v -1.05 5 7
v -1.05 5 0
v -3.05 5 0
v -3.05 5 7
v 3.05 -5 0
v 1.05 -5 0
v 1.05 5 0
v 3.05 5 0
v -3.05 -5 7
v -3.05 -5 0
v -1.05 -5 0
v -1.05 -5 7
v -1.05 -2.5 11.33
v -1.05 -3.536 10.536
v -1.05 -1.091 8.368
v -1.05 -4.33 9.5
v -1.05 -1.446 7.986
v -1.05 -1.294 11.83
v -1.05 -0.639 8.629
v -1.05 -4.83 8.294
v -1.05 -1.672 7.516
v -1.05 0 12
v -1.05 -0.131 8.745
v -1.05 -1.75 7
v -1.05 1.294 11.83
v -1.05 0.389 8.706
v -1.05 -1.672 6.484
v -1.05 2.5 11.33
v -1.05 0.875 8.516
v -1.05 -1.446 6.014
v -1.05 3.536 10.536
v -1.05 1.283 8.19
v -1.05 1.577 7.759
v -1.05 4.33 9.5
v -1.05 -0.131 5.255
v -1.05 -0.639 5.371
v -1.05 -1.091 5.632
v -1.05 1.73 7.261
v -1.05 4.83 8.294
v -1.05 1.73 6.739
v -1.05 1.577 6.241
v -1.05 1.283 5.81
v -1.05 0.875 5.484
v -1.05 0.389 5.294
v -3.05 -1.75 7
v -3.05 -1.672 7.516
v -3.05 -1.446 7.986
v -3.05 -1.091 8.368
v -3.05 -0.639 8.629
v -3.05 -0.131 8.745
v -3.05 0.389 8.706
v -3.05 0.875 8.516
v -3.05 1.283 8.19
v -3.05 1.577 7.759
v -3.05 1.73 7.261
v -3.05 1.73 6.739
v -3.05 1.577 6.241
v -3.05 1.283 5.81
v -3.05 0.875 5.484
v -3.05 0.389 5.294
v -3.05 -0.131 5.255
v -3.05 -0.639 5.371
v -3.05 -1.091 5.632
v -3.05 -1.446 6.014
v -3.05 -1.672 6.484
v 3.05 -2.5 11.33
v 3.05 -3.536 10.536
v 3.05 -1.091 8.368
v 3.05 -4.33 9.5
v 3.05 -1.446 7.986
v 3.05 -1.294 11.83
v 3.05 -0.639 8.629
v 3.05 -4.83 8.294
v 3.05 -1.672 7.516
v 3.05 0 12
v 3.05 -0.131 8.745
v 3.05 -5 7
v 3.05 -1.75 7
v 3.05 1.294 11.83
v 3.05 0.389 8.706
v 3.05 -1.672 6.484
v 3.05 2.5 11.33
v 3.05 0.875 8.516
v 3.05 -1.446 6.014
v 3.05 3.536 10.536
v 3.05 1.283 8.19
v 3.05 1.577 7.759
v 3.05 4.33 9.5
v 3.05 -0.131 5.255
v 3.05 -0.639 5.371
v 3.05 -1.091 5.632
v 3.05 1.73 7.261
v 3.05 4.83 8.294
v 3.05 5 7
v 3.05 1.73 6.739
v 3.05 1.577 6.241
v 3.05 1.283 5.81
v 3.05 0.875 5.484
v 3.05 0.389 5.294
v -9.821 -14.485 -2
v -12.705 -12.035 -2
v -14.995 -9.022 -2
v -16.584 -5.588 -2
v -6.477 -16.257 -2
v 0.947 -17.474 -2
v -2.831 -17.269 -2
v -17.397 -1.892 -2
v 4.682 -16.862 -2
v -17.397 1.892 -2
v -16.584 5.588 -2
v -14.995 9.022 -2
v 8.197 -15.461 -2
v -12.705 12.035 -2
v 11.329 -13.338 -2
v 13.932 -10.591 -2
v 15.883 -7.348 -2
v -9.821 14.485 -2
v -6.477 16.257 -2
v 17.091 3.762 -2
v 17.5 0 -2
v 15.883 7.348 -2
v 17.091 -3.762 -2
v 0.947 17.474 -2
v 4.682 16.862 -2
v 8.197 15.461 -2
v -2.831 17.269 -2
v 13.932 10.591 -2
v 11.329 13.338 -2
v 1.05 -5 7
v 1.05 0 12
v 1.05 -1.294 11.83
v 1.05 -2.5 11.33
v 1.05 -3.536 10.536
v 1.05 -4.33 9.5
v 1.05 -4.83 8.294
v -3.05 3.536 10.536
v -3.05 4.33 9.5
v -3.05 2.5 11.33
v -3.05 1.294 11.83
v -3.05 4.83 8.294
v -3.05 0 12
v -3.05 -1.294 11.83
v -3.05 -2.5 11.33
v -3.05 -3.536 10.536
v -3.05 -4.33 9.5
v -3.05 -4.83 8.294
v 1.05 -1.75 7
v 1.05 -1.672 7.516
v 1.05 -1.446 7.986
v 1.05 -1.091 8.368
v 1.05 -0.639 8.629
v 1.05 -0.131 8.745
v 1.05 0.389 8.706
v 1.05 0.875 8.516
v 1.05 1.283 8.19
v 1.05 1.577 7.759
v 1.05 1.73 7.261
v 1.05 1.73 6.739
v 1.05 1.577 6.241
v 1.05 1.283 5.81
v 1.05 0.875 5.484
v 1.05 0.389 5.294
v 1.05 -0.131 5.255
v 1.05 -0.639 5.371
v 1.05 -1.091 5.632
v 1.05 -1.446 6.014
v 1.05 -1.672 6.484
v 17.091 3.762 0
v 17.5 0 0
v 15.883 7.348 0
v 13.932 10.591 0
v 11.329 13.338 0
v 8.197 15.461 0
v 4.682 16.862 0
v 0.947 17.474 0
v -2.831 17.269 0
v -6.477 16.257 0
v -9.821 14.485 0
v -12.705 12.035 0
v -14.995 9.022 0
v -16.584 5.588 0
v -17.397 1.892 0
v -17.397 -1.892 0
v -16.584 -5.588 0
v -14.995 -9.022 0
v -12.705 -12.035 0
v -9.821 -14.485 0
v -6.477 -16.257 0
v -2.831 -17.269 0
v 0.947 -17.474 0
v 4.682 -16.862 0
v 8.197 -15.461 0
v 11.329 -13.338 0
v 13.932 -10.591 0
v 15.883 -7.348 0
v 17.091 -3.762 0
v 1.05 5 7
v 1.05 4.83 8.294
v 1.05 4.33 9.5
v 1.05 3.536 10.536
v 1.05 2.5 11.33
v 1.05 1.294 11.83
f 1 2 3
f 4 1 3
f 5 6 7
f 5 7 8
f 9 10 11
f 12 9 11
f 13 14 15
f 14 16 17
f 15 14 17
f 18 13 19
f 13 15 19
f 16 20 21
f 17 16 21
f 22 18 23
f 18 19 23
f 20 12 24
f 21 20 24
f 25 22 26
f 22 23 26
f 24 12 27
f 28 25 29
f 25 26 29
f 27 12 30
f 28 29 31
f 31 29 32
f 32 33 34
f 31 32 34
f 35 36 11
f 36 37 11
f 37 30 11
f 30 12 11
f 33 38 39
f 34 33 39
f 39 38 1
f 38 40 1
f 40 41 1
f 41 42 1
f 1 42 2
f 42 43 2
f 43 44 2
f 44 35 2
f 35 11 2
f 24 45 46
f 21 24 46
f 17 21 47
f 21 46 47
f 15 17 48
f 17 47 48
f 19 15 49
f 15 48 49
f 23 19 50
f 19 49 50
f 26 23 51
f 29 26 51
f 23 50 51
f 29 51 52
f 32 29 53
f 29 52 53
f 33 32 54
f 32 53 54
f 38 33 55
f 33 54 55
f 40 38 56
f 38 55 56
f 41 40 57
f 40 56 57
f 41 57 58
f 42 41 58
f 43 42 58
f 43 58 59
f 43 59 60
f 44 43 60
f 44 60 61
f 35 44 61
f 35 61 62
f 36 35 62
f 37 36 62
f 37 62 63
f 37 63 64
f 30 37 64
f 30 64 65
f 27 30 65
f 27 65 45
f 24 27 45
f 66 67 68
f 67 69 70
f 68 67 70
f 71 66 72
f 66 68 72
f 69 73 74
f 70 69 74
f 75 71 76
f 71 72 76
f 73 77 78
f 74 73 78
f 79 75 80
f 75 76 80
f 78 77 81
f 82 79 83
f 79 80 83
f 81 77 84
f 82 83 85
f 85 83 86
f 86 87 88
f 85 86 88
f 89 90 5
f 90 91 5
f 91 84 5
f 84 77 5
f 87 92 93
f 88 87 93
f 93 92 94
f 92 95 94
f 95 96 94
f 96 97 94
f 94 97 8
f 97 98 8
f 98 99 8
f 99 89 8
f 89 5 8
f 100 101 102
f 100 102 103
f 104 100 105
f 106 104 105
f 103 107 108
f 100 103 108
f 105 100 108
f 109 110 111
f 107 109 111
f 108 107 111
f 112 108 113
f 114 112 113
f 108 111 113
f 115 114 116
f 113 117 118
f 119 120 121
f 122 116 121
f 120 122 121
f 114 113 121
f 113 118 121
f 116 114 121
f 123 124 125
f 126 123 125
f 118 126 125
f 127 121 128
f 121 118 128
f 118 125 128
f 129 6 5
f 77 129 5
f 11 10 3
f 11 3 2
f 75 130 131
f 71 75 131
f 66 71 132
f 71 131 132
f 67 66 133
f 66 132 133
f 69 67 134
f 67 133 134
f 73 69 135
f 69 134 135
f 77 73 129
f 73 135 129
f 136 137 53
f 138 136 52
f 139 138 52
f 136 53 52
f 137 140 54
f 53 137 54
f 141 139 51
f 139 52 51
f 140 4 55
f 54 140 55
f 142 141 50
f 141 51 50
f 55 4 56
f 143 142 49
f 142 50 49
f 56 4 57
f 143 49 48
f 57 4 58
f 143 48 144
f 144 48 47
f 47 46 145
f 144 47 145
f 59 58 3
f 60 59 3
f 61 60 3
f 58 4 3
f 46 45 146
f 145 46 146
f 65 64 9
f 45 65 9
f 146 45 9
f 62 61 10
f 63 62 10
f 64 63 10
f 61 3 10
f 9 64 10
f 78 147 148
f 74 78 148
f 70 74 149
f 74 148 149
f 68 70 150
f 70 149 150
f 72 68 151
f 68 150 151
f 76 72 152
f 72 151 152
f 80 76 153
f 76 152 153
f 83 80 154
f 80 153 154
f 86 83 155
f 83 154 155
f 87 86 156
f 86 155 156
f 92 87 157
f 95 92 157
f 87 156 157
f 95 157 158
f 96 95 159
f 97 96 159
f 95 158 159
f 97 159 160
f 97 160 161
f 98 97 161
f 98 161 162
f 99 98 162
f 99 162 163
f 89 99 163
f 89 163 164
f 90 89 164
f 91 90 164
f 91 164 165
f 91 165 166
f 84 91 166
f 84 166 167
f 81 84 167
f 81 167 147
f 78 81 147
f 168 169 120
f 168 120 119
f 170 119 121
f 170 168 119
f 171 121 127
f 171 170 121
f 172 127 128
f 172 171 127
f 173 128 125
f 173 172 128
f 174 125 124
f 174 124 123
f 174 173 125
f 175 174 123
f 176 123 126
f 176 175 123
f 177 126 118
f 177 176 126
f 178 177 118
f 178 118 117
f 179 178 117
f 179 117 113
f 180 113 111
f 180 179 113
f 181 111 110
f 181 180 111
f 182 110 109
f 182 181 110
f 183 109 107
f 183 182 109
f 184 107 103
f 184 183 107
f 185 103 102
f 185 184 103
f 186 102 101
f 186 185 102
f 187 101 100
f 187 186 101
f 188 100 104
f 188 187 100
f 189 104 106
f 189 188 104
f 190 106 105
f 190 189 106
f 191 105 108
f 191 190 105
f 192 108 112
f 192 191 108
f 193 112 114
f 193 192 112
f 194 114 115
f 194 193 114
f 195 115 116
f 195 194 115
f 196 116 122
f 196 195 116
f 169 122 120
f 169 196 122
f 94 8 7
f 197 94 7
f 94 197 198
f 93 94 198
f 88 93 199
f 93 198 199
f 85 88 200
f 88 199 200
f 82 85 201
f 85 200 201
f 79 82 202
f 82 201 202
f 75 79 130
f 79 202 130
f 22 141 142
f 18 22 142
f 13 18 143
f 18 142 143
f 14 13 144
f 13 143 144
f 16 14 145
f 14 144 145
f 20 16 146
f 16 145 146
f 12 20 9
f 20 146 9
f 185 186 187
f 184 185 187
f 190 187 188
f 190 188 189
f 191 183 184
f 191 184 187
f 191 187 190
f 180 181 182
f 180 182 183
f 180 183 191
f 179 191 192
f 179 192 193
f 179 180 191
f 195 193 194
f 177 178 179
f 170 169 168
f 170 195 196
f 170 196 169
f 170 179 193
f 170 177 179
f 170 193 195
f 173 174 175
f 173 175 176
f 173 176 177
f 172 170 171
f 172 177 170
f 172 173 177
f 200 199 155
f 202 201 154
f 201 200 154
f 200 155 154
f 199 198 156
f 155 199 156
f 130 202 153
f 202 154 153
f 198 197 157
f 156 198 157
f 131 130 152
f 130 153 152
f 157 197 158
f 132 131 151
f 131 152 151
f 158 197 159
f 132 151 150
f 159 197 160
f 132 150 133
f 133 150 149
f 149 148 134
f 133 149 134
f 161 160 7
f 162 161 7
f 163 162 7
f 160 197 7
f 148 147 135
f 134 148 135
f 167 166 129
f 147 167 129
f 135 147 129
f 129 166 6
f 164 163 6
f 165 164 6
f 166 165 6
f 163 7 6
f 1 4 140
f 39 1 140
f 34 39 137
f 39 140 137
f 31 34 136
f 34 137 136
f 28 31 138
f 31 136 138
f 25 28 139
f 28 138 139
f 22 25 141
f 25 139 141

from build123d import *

# Parameters (mm, degrees)
F1_DEPTH = 12
F0_R     = 17.5
F2_DEPTH = 2
F3_R     = 1.75
F4_DEPTH = 25


with BuildPart() as f1:
    # F0 (on Top) → F1 (new body)
    with BuildSketch(Plane.XY):
        Polygon((-3.05, 5), (-3.05, 0), (-3.05, -5), (-1.05, -5), (-1.05, 0), (-1.05, 5), align=None)
        Polygon((3.05, 0), (3.05, 5), (1.05, 5), (1.05, 0), (1.05, -5), (3.05, -5), align=None)
    extrude(amount=F1_DEPTH)

    # F3 (on face) → F4 (cut)
    with BuildSketch(Plane(origin=(-3.05, 0, 0), x_dir=(0, -1, 0), z_dir=(-1, 0, 0))):
        with BuildLine():
            ThreePointArc((0, 12), (3.535534, 10.535534), (5, 7))
            Line((5, 7), (5, 12))
            Line((5, 12), (0, 12))
        make_face()
        with Locations((0, 7)):
            Circle(F3_R)
        with BuildLine():
            ThreePointArc((-5, 7), (-3.535534, 10.535534), (0, 12))
            Line((0, 12), (-5, 12))
            Line((-5, 12), (-5, 7))
        make_face()
    extrude(amount=-F4_DEPTH, mode=Mode.SUBTRACT)


with BuildPart() as f2:
    # F0 (on Top) → F2 (new body)
    with BuildSketch(Plane.XY):
        Circle(F0_R)
        Polygon((-3.05, -5), (-3.05, 0), (-3.05, 5), (-1.05, 5), (-1.05, 0), (-1.05, -5), align=None, mode=Mode.SUBTRACT)
        Polygon((1.05, 5), (3.05, 5), (3.05, 0), (3.05, -5), (1.05, -5), (1.05, 0), align=None, mode=Mode.SUBTRACT)
        Polygon((-3.05, 5), (-3.05, 0), (-3.05, -5), (-1.05, -5), (-1.05, 0), (-1.05, 5), align=None)
        Polygon((3.05, 0), (3.05, 5), (1.05, 5), (1.05, 0), (1.05, -5), (3.05, -5), align=None)
    extrude(amount=-F2_DEPTH)


solid = Compound([f1.part, f2.part])
